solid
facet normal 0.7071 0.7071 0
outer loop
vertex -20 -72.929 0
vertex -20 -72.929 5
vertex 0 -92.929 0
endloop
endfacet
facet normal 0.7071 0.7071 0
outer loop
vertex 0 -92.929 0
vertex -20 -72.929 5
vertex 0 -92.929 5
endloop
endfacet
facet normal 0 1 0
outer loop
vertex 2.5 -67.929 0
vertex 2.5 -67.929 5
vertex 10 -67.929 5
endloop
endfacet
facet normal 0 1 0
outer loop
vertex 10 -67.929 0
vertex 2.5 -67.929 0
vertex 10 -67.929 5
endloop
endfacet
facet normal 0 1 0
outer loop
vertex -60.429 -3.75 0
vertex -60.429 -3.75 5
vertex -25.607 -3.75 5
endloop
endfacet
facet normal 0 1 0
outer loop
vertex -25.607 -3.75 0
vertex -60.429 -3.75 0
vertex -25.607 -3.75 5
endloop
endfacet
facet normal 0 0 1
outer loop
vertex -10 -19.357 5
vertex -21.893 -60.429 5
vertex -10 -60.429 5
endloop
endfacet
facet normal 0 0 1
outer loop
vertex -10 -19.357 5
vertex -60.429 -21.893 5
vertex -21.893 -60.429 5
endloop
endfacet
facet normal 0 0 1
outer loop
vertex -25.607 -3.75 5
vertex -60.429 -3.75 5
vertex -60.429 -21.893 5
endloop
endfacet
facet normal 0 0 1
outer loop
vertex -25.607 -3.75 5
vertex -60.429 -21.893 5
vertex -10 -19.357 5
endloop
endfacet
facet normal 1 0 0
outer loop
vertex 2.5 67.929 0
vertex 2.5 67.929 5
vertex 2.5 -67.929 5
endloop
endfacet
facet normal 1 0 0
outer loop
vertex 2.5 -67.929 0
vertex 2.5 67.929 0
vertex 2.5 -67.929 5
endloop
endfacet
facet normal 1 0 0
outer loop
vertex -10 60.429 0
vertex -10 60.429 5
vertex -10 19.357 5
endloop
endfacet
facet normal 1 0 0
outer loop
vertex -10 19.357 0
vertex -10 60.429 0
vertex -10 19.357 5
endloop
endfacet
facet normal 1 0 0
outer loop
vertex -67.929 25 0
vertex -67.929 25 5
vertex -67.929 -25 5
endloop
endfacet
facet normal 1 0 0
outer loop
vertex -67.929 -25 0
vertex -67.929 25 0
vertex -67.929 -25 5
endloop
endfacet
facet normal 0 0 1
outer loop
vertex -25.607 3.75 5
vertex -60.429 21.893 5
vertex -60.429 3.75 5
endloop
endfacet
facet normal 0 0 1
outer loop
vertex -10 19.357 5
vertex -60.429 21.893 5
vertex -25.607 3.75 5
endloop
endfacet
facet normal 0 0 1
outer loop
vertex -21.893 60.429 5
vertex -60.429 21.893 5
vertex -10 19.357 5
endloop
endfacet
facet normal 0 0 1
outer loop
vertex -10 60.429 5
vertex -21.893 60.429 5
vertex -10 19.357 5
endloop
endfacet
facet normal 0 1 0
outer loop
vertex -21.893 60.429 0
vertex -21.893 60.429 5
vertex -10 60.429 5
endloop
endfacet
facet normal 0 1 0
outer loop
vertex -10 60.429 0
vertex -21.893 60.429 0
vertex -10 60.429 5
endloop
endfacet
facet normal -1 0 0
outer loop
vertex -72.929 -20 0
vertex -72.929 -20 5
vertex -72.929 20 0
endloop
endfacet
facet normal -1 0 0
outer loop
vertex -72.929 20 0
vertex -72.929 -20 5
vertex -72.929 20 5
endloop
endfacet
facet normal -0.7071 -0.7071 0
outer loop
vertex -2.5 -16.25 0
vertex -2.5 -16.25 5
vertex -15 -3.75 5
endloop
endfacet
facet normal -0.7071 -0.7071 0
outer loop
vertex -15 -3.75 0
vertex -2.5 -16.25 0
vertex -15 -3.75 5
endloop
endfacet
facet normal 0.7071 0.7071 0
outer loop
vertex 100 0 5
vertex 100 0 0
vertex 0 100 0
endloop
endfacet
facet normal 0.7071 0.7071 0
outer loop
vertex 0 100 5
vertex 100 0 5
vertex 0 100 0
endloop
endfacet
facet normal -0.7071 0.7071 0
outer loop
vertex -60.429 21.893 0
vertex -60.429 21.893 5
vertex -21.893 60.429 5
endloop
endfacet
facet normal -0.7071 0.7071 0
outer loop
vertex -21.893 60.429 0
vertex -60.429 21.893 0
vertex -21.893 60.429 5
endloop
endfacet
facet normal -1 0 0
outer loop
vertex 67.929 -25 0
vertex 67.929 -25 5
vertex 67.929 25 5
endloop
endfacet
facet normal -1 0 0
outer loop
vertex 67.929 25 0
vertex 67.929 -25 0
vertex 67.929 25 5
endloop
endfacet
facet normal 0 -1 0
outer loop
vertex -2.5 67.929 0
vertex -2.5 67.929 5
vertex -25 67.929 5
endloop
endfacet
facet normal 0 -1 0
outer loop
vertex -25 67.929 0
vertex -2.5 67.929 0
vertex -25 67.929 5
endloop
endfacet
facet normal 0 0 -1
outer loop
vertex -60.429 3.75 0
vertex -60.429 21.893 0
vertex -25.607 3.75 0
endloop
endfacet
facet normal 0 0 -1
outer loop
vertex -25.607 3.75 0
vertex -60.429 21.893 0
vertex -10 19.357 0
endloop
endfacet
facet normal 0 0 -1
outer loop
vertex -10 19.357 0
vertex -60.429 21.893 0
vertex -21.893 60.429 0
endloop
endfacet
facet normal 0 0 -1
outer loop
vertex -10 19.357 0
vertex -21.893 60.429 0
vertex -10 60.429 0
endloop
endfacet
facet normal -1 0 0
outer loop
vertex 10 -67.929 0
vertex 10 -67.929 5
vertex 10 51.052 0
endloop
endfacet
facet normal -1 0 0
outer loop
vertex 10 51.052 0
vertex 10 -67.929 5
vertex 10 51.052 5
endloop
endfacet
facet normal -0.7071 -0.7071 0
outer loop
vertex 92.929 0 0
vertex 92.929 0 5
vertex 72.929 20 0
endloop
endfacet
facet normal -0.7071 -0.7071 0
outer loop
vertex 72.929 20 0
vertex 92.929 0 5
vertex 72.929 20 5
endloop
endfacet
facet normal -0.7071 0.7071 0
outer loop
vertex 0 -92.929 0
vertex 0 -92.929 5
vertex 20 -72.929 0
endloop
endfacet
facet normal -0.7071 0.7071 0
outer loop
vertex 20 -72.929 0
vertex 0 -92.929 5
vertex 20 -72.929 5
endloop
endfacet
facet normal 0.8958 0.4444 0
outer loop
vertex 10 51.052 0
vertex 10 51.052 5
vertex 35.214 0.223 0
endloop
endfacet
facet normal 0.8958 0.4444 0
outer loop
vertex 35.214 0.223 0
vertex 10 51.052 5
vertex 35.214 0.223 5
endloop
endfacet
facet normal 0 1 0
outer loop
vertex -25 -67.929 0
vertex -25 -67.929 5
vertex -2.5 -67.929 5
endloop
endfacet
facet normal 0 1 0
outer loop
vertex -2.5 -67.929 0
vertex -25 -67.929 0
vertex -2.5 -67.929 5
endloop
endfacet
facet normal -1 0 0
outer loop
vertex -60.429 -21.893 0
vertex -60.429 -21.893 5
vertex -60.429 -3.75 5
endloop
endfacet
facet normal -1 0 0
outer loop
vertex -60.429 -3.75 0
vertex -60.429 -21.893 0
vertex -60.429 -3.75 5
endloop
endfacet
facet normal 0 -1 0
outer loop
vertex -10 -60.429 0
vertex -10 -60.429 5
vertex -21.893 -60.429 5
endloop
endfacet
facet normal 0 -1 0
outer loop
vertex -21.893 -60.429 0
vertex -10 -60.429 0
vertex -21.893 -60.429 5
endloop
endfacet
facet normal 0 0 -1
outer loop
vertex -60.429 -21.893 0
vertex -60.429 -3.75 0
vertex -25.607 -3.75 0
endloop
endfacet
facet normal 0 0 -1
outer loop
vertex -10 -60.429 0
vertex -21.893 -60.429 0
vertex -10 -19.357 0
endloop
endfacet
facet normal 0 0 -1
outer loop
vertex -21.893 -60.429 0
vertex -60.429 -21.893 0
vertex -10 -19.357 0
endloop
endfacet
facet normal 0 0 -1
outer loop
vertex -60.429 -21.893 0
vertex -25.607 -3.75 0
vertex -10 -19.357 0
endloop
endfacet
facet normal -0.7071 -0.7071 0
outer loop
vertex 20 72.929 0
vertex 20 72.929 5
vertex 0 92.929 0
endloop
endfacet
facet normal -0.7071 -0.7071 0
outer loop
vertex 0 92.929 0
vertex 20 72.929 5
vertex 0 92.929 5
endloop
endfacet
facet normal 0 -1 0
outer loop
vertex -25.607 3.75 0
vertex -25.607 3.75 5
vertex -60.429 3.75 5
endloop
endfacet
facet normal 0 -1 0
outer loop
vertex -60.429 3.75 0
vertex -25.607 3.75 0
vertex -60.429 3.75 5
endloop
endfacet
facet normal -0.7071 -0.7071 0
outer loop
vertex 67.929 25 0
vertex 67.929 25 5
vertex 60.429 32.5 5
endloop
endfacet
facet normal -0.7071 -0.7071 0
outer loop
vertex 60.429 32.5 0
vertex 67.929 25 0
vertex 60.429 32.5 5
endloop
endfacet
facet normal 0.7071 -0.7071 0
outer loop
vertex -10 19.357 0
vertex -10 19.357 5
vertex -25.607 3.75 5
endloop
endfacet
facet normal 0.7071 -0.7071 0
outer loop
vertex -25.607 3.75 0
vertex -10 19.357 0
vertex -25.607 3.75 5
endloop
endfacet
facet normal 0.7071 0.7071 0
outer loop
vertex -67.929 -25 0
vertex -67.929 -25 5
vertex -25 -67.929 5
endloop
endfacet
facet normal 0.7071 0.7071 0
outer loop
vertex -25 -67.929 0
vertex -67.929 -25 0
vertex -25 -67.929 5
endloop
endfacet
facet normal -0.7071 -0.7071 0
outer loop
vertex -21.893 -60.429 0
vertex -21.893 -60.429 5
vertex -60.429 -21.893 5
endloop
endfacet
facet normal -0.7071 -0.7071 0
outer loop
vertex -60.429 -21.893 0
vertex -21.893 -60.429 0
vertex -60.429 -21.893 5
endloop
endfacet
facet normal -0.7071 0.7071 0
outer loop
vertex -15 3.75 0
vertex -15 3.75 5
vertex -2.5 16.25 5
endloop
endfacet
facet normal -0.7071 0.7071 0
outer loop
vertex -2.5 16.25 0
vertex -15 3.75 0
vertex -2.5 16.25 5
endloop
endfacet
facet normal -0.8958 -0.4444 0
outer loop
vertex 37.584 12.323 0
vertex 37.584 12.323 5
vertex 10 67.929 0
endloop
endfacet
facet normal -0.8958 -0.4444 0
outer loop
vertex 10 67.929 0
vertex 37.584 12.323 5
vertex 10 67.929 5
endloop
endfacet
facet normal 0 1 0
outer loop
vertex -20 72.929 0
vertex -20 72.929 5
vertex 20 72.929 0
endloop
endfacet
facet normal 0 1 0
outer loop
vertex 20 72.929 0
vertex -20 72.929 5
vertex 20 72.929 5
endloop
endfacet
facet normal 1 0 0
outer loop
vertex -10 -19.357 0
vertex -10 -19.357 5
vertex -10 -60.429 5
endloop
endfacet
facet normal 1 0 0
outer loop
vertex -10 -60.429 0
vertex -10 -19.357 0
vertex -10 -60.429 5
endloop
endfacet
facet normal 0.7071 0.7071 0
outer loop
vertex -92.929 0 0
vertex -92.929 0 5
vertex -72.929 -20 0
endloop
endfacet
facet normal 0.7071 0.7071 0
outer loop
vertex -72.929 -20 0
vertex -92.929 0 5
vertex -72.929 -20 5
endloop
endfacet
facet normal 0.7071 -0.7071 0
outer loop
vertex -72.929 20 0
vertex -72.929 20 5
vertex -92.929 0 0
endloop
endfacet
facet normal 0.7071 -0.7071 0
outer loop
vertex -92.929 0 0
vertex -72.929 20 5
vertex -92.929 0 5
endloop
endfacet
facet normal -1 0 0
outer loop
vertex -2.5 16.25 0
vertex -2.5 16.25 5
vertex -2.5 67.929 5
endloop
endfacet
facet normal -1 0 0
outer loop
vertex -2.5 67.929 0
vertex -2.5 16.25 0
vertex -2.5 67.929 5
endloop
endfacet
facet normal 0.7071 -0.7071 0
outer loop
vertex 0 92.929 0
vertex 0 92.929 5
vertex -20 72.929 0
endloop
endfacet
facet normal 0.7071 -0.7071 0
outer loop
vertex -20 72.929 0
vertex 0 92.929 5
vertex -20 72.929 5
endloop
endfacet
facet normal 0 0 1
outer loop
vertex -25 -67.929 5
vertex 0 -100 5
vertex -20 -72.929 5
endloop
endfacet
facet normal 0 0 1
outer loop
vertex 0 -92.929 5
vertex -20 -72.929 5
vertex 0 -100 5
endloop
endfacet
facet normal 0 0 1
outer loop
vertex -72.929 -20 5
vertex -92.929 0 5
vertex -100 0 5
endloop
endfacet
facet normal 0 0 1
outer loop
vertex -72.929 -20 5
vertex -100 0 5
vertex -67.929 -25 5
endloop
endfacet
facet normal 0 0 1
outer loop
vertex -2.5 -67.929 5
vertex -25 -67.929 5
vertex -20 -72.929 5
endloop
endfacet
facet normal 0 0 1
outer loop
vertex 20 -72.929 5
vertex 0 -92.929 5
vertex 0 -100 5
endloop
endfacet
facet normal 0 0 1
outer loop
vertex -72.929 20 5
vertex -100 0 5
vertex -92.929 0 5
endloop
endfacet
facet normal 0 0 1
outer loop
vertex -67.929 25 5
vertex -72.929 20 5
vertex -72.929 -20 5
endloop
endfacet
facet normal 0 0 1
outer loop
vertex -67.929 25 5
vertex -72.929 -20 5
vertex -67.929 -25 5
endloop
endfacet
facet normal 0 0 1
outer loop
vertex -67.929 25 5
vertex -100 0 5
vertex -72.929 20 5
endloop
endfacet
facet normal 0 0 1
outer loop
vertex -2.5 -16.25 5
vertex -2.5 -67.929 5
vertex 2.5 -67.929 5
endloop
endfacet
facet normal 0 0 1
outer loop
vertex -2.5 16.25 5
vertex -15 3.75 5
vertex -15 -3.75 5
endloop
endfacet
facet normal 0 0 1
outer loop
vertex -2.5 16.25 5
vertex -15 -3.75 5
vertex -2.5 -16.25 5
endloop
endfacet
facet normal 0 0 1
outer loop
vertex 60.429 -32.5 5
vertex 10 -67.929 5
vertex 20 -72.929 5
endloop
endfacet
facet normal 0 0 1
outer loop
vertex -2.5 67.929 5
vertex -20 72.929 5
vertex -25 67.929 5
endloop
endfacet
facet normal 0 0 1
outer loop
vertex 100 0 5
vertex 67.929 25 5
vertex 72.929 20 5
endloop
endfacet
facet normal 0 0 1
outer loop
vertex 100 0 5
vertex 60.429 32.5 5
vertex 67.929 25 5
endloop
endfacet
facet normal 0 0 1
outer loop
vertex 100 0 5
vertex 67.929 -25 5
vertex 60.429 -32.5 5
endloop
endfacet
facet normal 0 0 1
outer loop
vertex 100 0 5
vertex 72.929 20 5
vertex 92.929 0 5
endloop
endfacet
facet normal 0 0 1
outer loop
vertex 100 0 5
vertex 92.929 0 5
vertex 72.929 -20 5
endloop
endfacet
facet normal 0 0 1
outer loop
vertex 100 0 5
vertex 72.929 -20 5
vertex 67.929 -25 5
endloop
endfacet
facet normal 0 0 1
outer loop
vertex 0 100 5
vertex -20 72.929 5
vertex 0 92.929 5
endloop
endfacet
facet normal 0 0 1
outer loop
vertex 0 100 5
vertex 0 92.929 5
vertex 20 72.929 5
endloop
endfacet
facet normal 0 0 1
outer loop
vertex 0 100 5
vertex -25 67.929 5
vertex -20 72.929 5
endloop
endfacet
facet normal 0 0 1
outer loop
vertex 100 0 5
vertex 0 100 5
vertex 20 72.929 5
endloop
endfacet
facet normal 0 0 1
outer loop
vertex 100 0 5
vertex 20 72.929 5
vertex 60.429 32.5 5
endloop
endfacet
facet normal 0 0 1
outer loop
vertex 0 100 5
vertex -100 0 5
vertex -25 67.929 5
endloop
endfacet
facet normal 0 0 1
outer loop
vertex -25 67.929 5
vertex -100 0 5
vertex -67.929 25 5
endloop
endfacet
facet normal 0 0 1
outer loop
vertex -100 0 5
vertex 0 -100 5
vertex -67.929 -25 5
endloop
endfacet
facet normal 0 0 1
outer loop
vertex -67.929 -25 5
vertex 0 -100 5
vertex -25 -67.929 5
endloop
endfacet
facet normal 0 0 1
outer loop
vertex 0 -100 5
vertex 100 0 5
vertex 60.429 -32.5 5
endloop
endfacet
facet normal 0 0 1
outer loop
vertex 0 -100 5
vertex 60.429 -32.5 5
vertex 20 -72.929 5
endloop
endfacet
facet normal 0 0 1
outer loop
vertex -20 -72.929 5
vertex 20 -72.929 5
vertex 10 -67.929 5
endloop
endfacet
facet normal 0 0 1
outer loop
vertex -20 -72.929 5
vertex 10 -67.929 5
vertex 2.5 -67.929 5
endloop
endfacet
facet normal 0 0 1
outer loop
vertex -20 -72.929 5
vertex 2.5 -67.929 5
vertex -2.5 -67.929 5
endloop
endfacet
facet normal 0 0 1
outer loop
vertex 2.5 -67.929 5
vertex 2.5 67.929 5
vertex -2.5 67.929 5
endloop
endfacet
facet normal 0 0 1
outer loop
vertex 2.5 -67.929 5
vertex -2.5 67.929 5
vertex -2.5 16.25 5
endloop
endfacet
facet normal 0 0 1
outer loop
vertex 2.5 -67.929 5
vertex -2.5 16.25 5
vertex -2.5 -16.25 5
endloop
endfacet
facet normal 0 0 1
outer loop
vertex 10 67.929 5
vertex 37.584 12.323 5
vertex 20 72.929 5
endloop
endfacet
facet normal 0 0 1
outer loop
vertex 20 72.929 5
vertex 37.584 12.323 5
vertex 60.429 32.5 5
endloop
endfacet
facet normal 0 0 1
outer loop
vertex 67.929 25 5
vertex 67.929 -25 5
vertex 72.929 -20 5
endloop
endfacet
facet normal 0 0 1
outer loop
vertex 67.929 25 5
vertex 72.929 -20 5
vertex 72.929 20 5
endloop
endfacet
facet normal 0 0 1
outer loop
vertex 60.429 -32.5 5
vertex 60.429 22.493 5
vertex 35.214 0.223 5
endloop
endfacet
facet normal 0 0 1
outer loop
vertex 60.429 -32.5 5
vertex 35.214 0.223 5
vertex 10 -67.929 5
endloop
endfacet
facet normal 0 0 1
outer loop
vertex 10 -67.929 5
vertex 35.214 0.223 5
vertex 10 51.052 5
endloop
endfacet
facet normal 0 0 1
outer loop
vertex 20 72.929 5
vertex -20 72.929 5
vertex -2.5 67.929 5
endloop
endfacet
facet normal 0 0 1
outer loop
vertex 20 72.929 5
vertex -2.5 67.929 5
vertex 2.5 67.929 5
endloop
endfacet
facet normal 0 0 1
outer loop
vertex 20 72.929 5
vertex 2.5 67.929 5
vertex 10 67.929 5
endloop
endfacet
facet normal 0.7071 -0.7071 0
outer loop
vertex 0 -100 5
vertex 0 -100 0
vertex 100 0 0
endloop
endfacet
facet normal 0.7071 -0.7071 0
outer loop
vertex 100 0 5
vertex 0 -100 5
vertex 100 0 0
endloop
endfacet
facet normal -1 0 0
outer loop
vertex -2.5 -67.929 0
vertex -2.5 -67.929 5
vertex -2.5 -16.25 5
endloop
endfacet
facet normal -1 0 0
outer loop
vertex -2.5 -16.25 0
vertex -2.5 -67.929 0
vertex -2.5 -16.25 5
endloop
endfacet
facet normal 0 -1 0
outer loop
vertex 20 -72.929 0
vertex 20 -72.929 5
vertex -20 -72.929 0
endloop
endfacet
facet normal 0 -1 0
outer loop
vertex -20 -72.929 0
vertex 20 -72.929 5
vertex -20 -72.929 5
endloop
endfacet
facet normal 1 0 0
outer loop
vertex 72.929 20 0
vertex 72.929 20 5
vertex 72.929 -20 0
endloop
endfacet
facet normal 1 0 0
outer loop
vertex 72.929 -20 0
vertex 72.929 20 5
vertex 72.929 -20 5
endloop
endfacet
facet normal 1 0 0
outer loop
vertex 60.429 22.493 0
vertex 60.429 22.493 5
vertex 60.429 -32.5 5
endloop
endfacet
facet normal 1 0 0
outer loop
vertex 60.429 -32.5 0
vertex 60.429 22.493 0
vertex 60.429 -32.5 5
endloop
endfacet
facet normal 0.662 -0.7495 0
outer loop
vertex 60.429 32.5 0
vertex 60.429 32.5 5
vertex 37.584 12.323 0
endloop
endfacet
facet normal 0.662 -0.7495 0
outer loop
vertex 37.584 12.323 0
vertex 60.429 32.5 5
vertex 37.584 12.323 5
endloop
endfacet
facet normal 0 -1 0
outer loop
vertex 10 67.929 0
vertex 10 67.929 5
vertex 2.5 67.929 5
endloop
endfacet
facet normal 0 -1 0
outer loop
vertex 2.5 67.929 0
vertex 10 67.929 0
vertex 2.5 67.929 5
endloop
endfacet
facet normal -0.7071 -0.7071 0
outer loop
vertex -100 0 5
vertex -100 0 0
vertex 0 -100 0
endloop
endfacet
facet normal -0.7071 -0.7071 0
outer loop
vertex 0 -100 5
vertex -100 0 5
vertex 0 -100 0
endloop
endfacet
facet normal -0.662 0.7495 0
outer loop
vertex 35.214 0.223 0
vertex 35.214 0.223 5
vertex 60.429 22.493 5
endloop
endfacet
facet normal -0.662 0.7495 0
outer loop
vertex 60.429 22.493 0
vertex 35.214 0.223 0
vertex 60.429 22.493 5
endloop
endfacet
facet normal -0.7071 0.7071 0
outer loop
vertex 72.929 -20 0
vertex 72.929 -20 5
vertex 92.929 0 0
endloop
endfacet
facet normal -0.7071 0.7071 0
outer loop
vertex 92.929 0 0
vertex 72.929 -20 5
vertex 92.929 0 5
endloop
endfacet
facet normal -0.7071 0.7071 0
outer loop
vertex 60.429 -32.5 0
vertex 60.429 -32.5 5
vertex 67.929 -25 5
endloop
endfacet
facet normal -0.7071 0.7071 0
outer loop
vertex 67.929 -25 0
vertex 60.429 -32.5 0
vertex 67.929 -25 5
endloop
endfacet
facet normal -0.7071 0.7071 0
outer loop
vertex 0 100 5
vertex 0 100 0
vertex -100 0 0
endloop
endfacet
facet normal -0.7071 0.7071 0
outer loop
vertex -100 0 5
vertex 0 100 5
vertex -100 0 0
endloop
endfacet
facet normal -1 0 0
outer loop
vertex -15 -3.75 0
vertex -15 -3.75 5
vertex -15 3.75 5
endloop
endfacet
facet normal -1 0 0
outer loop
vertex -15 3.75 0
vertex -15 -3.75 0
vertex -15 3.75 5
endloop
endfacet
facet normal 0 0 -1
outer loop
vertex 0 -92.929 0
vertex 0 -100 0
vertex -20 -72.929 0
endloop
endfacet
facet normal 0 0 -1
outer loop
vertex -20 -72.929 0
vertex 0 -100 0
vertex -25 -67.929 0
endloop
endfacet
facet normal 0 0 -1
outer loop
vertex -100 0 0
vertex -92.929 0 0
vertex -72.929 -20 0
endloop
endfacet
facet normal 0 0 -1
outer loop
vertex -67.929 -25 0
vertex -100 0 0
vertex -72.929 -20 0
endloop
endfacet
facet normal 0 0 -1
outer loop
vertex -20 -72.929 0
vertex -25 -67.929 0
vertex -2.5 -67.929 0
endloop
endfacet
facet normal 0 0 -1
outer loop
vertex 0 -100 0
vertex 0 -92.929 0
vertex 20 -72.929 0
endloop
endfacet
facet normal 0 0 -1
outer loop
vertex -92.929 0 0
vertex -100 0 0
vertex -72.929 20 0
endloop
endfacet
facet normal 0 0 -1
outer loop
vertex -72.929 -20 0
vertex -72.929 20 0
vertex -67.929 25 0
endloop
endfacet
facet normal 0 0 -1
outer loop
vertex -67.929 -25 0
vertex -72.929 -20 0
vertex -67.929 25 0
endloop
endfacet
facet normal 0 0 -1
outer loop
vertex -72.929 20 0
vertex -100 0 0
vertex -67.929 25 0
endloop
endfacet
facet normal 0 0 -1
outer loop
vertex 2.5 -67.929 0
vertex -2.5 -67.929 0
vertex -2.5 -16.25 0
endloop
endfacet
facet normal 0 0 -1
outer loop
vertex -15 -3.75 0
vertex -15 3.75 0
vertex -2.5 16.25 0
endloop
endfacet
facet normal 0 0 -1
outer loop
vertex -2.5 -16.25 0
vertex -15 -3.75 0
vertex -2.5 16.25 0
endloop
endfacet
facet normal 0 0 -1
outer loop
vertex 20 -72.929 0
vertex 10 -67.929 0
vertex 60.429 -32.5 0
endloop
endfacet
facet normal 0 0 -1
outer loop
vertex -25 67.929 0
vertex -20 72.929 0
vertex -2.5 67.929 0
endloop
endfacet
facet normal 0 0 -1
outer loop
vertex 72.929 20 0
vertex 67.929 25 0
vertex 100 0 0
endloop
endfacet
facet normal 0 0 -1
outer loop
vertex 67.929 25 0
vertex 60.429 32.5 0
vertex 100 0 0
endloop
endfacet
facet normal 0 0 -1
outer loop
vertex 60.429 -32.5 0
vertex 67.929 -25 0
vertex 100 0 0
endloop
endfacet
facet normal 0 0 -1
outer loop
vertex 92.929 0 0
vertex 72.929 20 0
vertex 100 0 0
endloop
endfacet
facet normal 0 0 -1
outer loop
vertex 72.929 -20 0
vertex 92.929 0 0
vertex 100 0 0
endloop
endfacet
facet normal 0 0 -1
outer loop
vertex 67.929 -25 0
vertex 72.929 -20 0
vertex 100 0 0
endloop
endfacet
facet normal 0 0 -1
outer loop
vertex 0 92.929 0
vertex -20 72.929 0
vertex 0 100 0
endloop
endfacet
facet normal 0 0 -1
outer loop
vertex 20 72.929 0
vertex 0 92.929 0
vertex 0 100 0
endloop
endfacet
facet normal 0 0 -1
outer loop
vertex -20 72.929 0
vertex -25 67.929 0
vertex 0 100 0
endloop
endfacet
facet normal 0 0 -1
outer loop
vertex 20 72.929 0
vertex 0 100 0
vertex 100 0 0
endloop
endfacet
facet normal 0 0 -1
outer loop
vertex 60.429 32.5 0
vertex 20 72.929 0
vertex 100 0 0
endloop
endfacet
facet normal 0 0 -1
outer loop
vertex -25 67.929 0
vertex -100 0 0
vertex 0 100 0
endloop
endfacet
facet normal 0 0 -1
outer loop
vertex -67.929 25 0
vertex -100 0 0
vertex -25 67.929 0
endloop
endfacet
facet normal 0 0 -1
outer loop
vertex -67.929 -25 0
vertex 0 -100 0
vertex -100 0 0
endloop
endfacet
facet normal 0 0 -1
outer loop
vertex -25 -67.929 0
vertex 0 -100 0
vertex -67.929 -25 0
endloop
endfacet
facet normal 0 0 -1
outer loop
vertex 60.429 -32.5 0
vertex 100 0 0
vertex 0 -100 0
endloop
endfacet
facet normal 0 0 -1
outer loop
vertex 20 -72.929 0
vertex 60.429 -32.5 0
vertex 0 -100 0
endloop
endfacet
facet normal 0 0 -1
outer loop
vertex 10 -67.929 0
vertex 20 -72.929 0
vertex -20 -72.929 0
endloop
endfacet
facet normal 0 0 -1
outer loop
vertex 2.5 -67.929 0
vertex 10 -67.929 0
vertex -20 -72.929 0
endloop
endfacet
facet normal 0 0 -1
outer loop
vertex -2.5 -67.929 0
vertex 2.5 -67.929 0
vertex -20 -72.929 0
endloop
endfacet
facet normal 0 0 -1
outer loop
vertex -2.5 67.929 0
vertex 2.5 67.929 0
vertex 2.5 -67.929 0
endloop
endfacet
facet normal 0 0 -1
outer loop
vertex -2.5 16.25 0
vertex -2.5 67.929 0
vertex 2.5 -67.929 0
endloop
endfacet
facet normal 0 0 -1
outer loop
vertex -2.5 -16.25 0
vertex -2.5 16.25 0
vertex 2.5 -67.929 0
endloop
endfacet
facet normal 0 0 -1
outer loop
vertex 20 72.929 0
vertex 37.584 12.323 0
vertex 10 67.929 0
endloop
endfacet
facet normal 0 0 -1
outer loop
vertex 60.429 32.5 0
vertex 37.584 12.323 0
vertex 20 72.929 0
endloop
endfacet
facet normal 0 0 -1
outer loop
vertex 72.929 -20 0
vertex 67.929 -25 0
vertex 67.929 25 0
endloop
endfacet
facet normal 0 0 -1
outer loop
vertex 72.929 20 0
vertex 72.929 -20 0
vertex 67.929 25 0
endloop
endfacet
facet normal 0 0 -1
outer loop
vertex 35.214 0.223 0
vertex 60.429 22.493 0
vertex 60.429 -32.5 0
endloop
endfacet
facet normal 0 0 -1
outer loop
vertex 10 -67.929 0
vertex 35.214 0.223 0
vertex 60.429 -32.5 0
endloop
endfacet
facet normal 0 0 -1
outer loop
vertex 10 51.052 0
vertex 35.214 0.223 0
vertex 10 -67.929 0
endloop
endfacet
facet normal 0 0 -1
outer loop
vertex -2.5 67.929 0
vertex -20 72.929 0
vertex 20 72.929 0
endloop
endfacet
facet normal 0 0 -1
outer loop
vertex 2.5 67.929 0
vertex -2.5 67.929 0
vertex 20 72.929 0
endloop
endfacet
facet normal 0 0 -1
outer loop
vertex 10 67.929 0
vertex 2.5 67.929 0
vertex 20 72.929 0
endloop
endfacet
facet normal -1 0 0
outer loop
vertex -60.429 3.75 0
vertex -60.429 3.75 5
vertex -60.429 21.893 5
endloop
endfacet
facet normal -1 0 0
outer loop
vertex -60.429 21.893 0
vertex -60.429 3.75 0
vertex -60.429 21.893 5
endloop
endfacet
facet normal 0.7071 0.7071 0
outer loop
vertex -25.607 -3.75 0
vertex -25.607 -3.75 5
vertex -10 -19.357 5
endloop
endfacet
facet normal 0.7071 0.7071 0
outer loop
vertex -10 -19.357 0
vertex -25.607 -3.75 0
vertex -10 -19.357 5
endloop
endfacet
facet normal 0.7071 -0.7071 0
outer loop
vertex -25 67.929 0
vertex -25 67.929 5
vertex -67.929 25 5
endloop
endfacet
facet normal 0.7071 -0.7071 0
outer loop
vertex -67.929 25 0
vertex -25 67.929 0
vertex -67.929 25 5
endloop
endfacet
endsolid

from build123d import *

# Parameters (mm, degrees)
F1_DEPTH = 5
F3_DEPTH = 5.001
F6_DEPTH = 5.001


with BuildPart() as f1:
    # F0 (on Top) → F1 (new body)
    with BuildSketch(Plane.XY):
        Polygon((100, 0), (0, 100), (-100, 0), (0, -100), align=None)
    extrude(amount=F1_DEPTH)

    # F2 (on face) → F3 (cut, through all)
    with BuildSketch(Plane.XY.offset(5)):
        Polygon((-92.928932, 0), (-72.928932, -20), (-72.928932, 20), align=None)
        Polygon((0, 92.928932), (-20, 72.928932), (20, 72.928932), align=None)
        Polygon((92.928932, 0), (72.928932, 20), (72.928932, -20), align=None)
        Polygon((0, -92.928932), (20, -72.928932), (-20, -72.928932), align=None)
    extrude(amount=-F3_DEPTH, mode=Mode.SUBTRACT)

    # F5 (on face) + F4 (on face) → F6 (cut, through all)
    with BuildSketch(Plane.XY.offset(5)):
        Polygon((2.5, 67.928932), (2.5, -67.928932), (10, -67.928932), (10, 51.051879), (35.214466, 0.222794), (60.428932, 22.493399), (60.428932, -32.5), (67.928932, -25), (67.928932, 25), (60.428932, 32.5), (37.584309, 12.322552), (10, 67.928932), align=None)
    with BuildSketch(Plane.XY.offset(5)):
        Polygon((-67.928932, 25), (-67.928932, -25), (-25, -67.928932), (-2.5, -67.928932), (-2.5, -16.25), (-15, -3.75), (-15, 3.75), (-2.5, 16.25), (-2.5, 67.928932), (-25, 67.928932), align=None)
        Polygon((-21.893398, -60.428932), (-60.428932, -21.893398), (-60.428932, -3.75), (-25.606602, -3.75), (-10, -19.356602), (-10, -60.428932), align=None, mode=Mode.SUBTRACT)
        Polygon((-60.428932, 21.893398), (-21.893398, 60.428932), (-10, 60.428932), (-10, 19.356602), (-25.606602, 3.75), (-60.428932, 3.75), align=None, mode=Mode.SUBTRACT)
    extrude(amount=-F6_DEPTH, mode=Mode.SUBTRACT)


solid = f1.part
